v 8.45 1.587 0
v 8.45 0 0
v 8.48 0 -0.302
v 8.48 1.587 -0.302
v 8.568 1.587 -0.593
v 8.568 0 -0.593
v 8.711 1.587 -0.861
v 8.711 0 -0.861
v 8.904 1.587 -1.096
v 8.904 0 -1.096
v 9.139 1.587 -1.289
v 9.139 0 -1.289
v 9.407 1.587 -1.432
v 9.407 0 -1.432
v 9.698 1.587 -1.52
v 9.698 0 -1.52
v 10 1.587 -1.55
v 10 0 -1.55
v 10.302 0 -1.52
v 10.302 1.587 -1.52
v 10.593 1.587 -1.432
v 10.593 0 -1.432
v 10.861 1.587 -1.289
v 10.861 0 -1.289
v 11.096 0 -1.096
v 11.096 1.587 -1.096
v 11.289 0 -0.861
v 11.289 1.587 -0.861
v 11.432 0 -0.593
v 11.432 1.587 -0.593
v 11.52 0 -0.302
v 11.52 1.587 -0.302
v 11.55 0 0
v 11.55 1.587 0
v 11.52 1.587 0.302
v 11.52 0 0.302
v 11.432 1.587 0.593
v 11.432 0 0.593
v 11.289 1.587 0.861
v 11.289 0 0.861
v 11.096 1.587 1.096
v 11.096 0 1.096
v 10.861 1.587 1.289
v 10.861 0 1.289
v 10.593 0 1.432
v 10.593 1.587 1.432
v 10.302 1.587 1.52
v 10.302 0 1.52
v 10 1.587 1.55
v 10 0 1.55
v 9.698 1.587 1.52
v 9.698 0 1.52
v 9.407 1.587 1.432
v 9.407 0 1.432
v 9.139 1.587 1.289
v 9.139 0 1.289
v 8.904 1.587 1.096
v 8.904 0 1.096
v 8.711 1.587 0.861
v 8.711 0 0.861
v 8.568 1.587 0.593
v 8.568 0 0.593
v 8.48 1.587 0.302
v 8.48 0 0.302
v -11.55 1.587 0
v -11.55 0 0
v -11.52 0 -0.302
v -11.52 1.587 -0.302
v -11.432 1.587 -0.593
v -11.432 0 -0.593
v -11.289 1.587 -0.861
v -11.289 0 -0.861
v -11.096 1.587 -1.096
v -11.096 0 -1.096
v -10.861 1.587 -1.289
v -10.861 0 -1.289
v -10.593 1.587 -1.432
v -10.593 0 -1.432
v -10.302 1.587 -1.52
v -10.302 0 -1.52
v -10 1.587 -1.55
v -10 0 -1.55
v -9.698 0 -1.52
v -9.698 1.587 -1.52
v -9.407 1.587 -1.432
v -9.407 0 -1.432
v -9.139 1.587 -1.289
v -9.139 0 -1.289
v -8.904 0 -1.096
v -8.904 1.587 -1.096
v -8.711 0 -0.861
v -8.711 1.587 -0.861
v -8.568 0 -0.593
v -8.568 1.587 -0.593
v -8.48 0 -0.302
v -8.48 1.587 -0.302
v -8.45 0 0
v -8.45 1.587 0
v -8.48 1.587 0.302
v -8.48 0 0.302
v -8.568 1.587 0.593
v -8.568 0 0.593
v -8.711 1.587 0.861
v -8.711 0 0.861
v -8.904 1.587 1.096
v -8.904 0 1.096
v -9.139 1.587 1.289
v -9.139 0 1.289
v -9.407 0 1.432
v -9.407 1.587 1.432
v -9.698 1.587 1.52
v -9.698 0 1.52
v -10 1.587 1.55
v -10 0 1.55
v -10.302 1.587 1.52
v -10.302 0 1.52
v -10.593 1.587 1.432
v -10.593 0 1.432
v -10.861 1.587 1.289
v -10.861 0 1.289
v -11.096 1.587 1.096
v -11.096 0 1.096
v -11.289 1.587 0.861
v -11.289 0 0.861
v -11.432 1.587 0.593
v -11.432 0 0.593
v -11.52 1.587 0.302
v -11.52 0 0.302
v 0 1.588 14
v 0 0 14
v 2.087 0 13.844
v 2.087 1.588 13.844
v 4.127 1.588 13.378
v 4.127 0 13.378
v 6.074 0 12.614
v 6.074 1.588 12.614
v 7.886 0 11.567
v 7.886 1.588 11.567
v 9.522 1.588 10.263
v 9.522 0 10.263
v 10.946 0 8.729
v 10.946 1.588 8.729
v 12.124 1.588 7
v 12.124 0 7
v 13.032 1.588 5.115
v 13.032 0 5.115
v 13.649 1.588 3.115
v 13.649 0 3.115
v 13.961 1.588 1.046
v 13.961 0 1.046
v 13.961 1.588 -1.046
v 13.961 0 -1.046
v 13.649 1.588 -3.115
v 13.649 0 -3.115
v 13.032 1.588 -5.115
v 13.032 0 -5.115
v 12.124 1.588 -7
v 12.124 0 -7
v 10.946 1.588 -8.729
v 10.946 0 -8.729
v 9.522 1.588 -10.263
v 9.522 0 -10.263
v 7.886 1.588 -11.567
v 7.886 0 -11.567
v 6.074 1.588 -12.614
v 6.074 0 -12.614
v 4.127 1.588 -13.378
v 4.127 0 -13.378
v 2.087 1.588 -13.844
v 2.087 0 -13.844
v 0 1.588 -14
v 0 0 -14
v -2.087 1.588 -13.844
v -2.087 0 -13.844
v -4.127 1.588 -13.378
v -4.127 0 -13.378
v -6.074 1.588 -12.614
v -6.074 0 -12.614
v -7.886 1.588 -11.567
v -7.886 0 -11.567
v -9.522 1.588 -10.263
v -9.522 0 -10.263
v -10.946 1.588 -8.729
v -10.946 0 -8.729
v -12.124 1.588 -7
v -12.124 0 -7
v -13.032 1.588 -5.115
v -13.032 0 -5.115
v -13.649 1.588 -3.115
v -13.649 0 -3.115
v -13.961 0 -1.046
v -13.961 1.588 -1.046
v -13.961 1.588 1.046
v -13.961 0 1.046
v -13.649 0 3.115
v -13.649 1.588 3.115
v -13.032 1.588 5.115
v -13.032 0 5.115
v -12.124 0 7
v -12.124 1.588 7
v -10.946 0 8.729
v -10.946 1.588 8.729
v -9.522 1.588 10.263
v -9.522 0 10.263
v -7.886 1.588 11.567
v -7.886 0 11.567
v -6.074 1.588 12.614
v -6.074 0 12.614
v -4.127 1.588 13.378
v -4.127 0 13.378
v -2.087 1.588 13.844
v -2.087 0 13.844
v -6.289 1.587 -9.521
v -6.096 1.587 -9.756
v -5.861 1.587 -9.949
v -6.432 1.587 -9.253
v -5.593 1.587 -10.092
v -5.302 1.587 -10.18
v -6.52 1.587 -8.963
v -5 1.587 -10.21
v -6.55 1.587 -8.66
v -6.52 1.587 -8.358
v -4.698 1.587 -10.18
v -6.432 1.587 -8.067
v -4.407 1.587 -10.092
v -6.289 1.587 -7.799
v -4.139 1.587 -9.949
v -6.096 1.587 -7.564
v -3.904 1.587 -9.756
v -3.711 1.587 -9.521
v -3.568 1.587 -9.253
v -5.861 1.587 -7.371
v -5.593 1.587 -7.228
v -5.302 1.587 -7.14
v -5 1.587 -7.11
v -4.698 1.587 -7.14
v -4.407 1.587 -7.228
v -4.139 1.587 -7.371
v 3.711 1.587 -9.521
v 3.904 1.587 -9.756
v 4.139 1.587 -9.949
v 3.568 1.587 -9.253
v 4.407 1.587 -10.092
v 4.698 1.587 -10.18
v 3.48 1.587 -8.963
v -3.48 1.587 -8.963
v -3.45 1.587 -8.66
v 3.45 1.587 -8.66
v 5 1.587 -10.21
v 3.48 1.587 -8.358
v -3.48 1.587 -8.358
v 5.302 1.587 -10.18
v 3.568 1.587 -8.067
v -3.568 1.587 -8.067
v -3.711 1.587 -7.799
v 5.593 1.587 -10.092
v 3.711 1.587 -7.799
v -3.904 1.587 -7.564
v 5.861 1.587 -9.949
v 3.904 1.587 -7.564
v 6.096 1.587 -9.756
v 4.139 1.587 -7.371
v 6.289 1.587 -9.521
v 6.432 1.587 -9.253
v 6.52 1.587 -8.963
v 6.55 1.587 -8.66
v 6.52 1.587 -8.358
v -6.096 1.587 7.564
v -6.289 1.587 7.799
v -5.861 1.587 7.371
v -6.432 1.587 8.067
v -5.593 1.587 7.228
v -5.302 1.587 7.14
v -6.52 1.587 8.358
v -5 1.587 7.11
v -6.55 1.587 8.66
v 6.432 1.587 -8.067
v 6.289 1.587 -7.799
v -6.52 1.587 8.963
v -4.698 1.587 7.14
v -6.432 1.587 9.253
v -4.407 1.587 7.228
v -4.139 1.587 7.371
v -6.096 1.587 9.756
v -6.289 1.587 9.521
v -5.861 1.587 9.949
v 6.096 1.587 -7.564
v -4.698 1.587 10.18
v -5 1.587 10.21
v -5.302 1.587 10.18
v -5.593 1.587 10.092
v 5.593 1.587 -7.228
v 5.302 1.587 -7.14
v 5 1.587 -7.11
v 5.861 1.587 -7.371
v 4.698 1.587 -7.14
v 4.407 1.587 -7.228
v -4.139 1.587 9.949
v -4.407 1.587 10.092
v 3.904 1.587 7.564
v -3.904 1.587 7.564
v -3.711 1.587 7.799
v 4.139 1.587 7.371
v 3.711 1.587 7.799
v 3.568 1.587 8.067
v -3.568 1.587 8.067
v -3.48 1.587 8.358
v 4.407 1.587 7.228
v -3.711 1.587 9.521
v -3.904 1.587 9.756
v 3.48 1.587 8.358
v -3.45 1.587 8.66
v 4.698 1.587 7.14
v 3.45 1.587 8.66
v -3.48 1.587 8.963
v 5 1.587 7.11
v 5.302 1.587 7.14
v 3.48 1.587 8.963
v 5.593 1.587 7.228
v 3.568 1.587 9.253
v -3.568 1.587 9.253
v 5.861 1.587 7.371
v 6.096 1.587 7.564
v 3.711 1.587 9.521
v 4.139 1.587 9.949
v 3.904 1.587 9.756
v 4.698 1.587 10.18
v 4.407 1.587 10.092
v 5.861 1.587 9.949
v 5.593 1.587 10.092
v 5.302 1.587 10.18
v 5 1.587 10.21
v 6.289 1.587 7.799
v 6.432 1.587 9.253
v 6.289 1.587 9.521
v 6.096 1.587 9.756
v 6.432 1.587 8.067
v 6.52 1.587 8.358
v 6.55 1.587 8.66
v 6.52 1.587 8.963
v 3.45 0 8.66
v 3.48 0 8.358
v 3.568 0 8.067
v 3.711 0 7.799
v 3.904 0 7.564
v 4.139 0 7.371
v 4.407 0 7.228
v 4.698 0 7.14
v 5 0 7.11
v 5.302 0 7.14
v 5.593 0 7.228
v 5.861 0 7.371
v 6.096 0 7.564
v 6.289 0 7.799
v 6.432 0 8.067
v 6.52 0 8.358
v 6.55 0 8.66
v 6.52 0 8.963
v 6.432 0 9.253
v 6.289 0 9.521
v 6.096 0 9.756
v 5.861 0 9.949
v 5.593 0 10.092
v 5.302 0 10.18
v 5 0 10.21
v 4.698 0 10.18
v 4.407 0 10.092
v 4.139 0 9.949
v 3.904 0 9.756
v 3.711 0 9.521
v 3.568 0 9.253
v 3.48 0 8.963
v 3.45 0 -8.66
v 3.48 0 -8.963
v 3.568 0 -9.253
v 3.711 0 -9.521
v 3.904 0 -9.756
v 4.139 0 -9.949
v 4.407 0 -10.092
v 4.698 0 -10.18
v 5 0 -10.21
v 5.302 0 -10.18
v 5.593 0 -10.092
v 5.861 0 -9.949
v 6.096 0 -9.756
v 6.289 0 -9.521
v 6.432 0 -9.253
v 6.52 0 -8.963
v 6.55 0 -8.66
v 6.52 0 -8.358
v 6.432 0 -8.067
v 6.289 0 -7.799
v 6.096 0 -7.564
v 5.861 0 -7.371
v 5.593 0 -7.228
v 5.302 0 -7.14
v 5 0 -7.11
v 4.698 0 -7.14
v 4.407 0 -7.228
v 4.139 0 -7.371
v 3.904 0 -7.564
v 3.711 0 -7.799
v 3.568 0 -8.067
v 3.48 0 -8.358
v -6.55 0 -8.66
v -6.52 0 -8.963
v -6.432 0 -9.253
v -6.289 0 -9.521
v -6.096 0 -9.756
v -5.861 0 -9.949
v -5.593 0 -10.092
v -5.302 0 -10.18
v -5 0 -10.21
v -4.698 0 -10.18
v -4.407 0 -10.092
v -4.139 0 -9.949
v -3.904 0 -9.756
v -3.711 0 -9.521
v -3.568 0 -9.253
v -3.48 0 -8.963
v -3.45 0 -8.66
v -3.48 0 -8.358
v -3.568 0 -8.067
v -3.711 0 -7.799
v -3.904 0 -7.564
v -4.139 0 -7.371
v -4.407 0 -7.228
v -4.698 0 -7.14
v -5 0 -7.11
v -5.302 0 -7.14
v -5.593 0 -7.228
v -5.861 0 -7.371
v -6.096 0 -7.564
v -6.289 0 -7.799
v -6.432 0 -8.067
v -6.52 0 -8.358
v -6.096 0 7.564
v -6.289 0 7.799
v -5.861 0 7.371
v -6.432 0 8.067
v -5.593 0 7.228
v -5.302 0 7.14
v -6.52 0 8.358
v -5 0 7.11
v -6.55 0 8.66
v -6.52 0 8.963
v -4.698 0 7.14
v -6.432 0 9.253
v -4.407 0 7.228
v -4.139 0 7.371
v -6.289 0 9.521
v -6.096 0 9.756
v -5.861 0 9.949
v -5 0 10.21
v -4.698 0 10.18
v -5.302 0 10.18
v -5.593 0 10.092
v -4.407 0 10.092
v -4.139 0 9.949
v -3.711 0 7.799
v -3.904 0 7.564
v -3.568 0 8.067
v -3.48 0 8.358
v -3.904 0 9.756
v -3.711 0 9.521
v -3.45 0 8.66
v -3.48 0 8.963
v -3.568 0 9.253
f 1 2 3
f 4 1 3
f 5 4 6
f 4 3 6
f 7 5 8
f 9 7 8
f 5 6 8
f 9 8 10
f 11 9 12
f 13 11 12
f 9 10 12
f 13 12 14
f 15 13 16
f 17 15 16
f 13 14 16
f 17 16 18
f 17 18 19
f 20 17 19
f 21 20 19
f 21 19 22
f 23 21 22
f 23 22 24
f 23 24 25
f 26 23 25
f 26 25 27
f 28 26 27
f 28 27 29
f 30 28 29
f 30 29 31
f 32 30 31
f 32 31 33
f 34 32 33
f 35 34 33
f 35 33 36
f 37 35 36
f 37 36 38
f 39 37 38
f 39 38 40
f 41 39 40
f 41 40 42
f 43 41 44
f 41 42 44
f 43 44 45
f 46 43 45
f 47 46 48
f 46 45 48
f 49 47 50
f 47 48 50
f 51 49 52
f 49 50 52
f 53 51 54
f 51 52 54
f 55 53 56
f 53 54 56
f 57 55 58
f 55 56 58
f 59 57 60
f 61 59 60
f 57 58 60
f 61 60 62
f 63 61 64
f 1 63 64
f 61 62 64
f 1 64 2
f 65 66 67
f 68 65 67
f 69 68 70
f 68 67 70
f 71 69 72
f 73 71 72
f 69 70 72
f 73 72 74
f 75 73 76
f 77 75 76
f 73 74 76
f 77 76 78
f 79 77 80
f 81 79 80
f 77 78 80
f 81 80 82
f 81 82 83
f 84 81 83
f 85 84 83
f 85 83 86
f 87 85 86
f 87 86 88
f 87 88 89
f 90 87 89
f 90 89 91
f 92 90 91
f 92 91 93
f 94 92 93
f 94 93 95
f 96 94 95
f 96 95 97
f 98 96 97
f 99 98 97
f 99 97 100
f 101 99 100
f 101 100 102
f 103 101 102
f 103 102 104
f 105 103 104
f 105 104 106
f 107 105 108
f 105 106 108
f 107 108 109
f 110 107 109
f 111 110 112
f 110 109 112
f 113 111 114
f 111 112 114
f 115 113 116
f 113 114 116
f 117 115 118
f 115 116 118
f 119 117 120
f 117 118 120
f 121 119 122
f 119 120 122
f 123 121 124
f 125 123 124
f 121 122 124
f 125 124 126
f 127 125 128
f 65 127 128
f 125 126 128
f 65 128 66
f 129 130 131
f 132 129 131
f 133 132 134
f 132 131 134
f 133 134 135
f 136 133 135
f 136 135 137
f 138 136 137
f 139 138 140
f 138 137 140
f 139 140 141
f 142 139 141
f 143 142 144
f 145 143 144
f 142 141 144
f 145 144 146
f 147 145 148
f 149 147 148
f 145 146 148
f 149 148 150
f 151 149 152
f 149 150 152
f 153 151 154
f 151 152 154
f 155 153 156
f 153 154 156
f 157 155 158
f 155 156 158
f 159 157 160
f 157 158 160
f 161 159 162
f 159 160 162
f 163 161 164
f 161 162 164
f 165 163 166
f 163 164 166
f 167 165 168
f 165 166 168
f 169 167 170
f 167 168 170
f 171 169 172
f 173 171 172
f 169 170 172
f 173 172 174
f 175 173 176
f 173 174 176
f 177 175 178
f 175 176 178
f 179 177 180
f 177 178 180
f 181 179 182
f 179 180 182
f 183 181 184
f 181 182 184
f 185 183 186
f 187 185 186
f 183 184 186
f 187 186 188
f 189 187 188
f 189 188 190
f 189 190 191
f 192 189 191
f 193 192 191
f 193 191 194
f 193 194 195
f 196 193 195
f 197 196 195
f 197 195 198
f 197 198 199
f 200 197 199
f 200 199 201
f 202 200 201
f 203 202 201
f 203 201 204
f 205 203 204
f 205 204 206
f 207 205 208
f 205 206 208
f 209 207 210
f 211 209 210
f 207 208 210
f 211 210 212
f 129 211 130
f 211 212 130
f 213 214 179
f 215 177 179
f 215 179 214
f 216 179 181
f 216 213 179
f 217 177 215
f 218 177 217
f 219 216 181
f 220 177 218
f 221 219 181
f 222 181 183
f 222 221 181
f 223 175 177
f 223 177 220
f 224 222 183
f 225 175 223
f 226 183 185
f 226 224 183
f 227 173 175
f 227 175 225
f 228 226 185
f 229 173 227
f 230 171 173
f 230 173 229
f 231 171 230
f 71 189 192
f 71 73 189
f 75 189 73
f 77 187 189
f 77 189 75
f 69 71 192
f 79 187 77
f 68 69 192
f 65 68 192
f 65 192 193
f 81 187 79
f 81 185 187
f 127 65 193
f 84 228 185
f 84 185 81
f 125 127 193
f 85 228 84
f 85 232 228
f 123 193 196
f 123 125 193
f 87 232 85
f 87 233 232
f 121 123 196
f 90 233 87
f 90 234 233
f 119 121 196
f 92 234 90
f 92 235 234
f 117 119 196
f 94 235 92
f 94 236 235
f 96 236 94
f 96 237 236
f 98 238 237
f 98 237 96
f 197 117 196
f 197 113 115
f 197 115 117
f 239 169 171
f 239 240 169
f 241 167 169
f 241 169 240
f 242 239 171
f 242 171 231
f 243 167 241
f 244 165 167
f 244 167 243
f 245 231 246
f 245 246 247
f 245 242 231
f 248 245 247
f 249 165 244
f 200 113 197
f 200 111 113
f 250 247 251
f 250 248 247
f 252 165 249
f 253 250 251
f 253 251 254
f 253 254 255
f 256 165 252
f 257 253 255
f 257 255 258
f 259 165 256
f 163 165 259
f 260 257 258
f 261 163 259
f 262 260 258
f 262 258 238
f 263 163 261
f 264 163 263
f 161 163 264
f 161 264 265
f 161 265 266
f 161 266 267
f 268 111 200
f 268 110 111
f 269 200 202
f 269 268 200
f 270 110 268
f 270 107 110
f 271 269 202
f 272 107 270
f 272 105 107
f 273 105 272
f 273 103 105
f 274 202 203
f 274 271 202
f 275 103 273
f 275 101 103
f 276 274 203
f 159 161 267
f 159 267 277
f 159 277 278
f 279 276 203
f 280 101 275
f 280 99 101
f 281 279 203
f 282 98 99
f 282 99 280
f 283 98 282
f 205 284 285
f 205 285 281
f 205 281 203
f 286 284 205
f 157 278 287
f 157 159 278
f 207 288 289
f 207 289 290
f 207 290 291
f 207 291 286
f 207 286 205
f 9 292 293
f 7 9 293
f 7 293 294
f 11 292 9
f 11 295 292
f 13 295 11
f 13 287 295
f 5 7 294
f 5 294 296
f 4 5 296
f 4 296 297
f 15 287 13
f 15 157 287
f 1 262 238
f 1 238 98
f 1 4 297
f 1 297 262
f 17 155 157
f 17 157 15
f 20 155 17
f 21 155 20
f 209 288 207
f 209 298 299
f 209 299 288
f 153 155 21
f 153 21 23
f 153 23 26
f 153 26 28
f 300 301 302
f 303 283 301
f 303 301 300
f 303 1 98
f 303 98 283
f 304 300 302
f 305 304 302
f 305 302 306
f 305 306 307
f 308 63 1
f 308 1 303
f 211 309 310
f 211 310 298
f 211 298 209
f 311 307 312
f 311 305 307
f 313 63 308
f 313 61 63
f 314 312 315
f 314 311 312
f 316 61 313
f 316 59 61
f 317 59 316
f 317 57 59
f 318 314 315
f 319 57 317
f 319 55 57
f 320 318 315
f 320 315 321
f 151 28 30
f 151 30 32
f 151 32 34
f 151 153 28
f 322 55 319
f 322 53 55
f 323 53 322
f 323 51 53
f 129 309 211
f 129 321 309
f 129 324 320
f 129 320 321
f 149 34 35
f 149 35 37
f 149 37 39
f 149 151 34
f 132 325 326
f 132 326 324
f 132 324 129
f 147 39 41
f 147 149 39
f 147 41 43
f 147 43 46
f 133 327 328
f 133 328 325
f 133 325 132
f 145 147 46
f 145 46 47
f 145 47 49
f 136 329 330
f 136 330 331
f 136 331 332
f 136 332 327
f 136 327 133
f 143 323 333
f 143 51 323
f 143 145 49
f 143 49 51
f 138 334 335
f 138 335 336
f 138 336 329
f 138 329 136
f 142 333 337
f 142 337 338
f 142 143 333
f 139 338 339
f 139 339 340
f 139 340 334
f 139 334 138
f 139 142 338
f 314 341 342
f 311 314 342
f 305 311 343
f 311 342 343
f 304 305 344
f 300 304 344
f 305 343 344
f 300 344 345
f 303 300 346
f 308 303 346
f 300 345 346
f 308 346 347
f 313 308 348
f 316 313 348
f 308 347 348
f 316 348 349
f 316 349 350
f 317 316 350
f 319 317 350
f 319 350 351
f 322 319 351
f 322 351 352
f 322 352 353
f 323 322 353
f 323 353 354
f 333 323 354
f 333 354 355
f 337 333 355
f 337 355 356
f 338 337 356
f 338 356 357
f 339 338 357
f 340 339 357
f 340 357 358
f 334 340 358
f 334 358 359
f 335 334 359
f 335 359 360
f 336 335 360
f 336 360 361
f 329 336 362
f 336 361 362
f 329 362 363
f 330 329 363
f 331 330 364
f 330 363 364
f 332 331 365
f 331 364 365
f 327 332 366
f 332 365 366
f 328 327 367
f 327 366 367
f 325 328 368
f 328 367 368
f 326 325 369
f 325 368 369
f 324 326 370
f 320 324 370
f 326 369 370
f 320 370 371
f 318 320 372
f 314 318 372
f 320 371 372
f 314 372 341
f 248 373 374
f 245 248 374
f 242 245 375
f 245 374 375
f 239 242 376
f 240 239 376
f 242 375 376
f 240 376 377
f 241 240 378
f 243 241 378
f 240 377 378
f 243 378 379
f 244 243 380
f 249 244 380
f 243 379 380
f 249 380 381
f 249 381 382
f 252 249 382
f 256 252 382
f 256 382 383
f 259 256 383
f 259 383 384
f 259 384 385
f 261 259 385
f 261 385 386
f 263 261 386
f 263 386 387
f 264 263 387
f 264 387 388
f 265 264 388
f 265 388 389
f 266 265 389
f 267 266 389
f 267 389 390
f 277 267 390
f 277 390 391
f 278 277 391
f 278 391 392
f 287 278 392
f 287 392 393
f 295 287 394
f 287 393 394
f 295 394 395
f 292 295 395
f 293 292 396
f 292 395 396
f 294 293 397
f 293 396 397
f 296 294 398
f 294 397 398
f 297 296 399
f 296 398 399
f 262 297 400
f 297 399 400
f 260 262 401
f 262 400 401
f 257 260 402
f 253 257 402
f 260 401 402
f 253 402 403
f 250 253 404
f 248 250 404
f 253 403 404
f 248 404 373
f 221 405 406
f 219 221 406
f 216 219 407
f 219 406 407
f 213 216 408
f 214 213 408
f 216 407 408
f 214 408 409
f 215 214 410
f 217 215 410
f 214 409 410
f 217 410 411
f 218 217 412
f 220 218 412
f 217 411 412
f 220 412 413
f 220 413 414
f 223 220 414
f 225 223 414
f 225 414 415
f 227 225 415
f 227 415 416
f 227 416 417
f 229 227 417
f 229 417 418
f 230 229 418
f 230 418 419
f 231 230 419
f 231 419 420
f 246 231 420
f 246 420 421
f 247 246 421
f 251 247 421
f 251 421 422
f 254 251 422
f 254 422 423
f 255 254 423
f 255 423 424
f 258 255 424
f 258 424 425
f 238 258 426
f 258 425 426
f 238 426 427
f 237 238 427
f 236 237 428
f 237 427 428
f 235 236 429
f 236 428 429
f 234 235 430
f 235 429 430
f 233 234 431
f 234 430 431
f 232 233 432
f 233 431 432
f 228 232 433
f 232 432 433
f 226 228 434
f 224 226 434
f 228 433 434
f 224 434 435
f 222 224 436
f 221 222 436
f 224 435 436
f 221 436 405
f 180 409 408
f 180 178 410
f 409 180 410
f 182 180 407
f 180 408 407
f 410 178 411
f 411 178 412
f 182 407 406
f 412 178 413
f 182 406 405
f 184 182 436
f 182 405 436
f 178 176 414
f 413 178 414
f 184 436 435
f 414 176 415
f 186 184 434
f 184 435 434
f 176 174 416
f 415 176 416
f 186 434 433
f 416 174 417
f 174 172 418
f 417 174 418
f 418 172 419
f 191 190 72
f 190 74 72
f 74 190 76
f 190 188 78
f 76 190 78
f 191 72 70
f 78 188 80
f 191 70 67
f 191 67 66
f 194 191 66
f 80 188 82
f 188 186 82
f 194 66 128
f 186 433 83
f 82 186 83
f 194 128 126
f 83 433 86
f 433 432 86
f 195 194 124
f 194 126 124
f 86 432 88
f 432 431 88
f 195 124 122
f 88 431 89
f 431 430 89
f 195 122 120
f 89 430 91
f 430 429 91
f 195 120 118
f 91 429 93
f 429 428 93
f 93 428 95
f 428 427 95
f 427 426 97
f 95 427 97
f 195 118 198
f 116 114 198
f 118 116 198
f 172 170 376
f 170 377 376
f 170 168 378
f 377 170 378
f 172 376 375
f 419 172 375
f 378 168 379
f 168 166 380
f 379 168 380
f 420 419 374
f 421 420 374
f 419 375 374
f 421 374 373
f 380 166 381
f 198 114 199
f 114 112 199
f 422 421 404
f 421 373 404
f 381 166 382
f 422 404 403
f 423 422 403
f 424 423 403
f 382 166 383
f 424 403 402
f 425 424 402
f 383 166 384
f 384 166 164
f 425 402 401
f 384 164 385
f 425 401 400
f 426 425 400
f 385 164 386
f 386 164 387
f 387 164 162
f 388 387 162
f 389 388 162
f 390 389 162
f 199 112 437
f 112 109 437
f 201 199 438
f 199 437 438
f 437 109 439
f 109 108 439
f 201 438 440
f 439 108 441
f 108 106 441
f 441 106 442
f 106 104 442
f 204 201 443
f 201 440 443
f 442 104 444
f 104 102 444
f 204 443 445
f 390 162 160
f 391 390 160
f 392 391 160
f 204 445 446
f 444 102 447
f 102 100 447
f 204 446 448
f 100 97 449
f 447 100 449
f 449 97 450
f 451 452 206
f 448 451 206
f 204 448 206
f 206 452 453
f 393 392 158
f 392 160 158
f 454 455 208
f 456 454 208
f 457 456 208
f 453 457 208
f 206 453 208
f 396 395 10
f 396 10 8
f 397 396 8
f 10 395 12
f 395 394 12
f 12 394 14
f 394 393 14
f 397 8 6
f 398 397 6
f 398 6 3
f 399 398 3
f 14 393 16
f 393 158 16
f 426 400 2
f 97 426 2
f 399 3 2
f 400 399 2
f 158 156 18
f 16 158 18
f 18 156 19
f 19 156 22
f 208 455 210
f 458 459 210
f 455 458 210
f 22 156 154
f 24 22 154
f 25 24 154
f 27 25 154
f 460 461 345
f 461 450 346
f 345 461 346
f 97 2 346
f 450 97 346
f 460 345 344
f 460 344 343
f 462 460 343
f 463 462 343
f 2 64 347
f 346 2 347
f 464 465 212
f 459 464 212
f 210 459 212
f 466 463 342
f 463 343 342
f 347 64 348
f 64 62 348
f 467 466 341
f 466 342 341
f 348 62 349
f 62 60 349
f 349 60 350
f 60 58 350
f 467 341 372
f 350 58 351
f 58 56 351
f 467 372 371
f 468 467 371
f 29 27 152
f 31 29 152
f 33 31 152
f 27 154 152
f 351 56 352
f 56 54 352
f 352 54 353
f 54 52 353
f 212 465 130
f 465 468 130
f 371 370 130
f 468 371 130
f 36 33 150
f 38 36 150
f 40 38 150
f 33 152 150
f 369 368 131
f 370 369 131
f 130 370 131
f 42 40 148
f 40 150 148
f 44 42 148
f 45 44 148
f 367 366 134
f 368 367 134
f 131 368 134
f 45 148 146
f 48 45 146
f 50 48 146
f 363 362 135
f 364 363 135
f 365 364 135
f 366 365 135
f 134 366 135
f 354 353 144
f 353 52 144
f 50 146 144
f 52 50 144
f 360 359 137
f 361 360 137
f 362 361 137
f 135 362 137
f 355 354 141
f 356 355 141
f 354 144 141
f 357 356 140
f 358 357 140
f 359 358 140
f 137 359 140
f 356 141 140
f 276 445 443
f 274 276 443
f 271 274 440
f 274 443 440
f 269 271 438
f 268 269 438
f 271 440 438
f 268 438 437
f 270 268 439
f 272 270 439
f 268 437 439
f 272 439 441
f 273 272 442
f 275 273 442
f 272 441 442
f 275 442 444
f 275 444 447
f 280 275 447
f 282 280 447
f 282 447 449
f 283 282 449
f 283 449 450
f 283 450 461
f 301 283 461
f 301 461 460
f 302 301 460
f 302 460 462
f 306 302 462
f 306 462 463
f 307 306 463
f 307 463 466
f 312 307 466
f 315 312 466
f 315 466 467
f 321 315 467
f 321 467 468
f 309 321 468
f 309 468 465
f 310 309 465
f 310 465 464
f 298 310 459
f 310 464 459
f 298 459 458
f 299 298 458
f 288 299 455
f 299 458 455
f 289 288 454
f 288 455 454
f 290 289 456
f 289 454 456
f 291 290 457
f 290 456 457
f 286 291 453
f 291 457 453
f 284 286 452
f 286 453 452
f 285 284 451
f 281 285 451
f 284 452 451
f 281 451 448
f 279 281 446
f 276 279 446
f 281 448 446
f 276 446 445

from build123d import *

# Parameters (mm, degrees)
SKETCH1_R             = 14
BOSS_EXTRUDE1_DEPTH   = 1.5875
F_3_0MM_DOWEL_HOLE1_D = 3.1


with BuildPart() as part:
    # Sketch1 → Boss-Extrude1 (new body)
    with BuildSketch(Plane(origin=(0, 0, 0), x_dir=(1, 0, 0), z_dir=(0, 1, 0))):
        with Locations(Location((0, 0, 0), (0, 0, 270))):
            Circle(SKETCH1_R)
    extrude(amount=BOSS_EXTRUDE1_DEPTH)

    # Ø3.0mm Dowel Hole1 (through all)
    with Locations(Plane(origin=(0, 1.5875, 0), x_dir=(1, 0, 0), z_dir=(0, 1, 0))):
        with Locations((-5, -8.660254038), (-10, 0), (-5, 8.660254038), (5, 8.660254038), (10, 0), (5, -8.660254038)):
            Hole(F_3_0MM_DOWEL_HOLE1_D / 2)


solid = part.part
